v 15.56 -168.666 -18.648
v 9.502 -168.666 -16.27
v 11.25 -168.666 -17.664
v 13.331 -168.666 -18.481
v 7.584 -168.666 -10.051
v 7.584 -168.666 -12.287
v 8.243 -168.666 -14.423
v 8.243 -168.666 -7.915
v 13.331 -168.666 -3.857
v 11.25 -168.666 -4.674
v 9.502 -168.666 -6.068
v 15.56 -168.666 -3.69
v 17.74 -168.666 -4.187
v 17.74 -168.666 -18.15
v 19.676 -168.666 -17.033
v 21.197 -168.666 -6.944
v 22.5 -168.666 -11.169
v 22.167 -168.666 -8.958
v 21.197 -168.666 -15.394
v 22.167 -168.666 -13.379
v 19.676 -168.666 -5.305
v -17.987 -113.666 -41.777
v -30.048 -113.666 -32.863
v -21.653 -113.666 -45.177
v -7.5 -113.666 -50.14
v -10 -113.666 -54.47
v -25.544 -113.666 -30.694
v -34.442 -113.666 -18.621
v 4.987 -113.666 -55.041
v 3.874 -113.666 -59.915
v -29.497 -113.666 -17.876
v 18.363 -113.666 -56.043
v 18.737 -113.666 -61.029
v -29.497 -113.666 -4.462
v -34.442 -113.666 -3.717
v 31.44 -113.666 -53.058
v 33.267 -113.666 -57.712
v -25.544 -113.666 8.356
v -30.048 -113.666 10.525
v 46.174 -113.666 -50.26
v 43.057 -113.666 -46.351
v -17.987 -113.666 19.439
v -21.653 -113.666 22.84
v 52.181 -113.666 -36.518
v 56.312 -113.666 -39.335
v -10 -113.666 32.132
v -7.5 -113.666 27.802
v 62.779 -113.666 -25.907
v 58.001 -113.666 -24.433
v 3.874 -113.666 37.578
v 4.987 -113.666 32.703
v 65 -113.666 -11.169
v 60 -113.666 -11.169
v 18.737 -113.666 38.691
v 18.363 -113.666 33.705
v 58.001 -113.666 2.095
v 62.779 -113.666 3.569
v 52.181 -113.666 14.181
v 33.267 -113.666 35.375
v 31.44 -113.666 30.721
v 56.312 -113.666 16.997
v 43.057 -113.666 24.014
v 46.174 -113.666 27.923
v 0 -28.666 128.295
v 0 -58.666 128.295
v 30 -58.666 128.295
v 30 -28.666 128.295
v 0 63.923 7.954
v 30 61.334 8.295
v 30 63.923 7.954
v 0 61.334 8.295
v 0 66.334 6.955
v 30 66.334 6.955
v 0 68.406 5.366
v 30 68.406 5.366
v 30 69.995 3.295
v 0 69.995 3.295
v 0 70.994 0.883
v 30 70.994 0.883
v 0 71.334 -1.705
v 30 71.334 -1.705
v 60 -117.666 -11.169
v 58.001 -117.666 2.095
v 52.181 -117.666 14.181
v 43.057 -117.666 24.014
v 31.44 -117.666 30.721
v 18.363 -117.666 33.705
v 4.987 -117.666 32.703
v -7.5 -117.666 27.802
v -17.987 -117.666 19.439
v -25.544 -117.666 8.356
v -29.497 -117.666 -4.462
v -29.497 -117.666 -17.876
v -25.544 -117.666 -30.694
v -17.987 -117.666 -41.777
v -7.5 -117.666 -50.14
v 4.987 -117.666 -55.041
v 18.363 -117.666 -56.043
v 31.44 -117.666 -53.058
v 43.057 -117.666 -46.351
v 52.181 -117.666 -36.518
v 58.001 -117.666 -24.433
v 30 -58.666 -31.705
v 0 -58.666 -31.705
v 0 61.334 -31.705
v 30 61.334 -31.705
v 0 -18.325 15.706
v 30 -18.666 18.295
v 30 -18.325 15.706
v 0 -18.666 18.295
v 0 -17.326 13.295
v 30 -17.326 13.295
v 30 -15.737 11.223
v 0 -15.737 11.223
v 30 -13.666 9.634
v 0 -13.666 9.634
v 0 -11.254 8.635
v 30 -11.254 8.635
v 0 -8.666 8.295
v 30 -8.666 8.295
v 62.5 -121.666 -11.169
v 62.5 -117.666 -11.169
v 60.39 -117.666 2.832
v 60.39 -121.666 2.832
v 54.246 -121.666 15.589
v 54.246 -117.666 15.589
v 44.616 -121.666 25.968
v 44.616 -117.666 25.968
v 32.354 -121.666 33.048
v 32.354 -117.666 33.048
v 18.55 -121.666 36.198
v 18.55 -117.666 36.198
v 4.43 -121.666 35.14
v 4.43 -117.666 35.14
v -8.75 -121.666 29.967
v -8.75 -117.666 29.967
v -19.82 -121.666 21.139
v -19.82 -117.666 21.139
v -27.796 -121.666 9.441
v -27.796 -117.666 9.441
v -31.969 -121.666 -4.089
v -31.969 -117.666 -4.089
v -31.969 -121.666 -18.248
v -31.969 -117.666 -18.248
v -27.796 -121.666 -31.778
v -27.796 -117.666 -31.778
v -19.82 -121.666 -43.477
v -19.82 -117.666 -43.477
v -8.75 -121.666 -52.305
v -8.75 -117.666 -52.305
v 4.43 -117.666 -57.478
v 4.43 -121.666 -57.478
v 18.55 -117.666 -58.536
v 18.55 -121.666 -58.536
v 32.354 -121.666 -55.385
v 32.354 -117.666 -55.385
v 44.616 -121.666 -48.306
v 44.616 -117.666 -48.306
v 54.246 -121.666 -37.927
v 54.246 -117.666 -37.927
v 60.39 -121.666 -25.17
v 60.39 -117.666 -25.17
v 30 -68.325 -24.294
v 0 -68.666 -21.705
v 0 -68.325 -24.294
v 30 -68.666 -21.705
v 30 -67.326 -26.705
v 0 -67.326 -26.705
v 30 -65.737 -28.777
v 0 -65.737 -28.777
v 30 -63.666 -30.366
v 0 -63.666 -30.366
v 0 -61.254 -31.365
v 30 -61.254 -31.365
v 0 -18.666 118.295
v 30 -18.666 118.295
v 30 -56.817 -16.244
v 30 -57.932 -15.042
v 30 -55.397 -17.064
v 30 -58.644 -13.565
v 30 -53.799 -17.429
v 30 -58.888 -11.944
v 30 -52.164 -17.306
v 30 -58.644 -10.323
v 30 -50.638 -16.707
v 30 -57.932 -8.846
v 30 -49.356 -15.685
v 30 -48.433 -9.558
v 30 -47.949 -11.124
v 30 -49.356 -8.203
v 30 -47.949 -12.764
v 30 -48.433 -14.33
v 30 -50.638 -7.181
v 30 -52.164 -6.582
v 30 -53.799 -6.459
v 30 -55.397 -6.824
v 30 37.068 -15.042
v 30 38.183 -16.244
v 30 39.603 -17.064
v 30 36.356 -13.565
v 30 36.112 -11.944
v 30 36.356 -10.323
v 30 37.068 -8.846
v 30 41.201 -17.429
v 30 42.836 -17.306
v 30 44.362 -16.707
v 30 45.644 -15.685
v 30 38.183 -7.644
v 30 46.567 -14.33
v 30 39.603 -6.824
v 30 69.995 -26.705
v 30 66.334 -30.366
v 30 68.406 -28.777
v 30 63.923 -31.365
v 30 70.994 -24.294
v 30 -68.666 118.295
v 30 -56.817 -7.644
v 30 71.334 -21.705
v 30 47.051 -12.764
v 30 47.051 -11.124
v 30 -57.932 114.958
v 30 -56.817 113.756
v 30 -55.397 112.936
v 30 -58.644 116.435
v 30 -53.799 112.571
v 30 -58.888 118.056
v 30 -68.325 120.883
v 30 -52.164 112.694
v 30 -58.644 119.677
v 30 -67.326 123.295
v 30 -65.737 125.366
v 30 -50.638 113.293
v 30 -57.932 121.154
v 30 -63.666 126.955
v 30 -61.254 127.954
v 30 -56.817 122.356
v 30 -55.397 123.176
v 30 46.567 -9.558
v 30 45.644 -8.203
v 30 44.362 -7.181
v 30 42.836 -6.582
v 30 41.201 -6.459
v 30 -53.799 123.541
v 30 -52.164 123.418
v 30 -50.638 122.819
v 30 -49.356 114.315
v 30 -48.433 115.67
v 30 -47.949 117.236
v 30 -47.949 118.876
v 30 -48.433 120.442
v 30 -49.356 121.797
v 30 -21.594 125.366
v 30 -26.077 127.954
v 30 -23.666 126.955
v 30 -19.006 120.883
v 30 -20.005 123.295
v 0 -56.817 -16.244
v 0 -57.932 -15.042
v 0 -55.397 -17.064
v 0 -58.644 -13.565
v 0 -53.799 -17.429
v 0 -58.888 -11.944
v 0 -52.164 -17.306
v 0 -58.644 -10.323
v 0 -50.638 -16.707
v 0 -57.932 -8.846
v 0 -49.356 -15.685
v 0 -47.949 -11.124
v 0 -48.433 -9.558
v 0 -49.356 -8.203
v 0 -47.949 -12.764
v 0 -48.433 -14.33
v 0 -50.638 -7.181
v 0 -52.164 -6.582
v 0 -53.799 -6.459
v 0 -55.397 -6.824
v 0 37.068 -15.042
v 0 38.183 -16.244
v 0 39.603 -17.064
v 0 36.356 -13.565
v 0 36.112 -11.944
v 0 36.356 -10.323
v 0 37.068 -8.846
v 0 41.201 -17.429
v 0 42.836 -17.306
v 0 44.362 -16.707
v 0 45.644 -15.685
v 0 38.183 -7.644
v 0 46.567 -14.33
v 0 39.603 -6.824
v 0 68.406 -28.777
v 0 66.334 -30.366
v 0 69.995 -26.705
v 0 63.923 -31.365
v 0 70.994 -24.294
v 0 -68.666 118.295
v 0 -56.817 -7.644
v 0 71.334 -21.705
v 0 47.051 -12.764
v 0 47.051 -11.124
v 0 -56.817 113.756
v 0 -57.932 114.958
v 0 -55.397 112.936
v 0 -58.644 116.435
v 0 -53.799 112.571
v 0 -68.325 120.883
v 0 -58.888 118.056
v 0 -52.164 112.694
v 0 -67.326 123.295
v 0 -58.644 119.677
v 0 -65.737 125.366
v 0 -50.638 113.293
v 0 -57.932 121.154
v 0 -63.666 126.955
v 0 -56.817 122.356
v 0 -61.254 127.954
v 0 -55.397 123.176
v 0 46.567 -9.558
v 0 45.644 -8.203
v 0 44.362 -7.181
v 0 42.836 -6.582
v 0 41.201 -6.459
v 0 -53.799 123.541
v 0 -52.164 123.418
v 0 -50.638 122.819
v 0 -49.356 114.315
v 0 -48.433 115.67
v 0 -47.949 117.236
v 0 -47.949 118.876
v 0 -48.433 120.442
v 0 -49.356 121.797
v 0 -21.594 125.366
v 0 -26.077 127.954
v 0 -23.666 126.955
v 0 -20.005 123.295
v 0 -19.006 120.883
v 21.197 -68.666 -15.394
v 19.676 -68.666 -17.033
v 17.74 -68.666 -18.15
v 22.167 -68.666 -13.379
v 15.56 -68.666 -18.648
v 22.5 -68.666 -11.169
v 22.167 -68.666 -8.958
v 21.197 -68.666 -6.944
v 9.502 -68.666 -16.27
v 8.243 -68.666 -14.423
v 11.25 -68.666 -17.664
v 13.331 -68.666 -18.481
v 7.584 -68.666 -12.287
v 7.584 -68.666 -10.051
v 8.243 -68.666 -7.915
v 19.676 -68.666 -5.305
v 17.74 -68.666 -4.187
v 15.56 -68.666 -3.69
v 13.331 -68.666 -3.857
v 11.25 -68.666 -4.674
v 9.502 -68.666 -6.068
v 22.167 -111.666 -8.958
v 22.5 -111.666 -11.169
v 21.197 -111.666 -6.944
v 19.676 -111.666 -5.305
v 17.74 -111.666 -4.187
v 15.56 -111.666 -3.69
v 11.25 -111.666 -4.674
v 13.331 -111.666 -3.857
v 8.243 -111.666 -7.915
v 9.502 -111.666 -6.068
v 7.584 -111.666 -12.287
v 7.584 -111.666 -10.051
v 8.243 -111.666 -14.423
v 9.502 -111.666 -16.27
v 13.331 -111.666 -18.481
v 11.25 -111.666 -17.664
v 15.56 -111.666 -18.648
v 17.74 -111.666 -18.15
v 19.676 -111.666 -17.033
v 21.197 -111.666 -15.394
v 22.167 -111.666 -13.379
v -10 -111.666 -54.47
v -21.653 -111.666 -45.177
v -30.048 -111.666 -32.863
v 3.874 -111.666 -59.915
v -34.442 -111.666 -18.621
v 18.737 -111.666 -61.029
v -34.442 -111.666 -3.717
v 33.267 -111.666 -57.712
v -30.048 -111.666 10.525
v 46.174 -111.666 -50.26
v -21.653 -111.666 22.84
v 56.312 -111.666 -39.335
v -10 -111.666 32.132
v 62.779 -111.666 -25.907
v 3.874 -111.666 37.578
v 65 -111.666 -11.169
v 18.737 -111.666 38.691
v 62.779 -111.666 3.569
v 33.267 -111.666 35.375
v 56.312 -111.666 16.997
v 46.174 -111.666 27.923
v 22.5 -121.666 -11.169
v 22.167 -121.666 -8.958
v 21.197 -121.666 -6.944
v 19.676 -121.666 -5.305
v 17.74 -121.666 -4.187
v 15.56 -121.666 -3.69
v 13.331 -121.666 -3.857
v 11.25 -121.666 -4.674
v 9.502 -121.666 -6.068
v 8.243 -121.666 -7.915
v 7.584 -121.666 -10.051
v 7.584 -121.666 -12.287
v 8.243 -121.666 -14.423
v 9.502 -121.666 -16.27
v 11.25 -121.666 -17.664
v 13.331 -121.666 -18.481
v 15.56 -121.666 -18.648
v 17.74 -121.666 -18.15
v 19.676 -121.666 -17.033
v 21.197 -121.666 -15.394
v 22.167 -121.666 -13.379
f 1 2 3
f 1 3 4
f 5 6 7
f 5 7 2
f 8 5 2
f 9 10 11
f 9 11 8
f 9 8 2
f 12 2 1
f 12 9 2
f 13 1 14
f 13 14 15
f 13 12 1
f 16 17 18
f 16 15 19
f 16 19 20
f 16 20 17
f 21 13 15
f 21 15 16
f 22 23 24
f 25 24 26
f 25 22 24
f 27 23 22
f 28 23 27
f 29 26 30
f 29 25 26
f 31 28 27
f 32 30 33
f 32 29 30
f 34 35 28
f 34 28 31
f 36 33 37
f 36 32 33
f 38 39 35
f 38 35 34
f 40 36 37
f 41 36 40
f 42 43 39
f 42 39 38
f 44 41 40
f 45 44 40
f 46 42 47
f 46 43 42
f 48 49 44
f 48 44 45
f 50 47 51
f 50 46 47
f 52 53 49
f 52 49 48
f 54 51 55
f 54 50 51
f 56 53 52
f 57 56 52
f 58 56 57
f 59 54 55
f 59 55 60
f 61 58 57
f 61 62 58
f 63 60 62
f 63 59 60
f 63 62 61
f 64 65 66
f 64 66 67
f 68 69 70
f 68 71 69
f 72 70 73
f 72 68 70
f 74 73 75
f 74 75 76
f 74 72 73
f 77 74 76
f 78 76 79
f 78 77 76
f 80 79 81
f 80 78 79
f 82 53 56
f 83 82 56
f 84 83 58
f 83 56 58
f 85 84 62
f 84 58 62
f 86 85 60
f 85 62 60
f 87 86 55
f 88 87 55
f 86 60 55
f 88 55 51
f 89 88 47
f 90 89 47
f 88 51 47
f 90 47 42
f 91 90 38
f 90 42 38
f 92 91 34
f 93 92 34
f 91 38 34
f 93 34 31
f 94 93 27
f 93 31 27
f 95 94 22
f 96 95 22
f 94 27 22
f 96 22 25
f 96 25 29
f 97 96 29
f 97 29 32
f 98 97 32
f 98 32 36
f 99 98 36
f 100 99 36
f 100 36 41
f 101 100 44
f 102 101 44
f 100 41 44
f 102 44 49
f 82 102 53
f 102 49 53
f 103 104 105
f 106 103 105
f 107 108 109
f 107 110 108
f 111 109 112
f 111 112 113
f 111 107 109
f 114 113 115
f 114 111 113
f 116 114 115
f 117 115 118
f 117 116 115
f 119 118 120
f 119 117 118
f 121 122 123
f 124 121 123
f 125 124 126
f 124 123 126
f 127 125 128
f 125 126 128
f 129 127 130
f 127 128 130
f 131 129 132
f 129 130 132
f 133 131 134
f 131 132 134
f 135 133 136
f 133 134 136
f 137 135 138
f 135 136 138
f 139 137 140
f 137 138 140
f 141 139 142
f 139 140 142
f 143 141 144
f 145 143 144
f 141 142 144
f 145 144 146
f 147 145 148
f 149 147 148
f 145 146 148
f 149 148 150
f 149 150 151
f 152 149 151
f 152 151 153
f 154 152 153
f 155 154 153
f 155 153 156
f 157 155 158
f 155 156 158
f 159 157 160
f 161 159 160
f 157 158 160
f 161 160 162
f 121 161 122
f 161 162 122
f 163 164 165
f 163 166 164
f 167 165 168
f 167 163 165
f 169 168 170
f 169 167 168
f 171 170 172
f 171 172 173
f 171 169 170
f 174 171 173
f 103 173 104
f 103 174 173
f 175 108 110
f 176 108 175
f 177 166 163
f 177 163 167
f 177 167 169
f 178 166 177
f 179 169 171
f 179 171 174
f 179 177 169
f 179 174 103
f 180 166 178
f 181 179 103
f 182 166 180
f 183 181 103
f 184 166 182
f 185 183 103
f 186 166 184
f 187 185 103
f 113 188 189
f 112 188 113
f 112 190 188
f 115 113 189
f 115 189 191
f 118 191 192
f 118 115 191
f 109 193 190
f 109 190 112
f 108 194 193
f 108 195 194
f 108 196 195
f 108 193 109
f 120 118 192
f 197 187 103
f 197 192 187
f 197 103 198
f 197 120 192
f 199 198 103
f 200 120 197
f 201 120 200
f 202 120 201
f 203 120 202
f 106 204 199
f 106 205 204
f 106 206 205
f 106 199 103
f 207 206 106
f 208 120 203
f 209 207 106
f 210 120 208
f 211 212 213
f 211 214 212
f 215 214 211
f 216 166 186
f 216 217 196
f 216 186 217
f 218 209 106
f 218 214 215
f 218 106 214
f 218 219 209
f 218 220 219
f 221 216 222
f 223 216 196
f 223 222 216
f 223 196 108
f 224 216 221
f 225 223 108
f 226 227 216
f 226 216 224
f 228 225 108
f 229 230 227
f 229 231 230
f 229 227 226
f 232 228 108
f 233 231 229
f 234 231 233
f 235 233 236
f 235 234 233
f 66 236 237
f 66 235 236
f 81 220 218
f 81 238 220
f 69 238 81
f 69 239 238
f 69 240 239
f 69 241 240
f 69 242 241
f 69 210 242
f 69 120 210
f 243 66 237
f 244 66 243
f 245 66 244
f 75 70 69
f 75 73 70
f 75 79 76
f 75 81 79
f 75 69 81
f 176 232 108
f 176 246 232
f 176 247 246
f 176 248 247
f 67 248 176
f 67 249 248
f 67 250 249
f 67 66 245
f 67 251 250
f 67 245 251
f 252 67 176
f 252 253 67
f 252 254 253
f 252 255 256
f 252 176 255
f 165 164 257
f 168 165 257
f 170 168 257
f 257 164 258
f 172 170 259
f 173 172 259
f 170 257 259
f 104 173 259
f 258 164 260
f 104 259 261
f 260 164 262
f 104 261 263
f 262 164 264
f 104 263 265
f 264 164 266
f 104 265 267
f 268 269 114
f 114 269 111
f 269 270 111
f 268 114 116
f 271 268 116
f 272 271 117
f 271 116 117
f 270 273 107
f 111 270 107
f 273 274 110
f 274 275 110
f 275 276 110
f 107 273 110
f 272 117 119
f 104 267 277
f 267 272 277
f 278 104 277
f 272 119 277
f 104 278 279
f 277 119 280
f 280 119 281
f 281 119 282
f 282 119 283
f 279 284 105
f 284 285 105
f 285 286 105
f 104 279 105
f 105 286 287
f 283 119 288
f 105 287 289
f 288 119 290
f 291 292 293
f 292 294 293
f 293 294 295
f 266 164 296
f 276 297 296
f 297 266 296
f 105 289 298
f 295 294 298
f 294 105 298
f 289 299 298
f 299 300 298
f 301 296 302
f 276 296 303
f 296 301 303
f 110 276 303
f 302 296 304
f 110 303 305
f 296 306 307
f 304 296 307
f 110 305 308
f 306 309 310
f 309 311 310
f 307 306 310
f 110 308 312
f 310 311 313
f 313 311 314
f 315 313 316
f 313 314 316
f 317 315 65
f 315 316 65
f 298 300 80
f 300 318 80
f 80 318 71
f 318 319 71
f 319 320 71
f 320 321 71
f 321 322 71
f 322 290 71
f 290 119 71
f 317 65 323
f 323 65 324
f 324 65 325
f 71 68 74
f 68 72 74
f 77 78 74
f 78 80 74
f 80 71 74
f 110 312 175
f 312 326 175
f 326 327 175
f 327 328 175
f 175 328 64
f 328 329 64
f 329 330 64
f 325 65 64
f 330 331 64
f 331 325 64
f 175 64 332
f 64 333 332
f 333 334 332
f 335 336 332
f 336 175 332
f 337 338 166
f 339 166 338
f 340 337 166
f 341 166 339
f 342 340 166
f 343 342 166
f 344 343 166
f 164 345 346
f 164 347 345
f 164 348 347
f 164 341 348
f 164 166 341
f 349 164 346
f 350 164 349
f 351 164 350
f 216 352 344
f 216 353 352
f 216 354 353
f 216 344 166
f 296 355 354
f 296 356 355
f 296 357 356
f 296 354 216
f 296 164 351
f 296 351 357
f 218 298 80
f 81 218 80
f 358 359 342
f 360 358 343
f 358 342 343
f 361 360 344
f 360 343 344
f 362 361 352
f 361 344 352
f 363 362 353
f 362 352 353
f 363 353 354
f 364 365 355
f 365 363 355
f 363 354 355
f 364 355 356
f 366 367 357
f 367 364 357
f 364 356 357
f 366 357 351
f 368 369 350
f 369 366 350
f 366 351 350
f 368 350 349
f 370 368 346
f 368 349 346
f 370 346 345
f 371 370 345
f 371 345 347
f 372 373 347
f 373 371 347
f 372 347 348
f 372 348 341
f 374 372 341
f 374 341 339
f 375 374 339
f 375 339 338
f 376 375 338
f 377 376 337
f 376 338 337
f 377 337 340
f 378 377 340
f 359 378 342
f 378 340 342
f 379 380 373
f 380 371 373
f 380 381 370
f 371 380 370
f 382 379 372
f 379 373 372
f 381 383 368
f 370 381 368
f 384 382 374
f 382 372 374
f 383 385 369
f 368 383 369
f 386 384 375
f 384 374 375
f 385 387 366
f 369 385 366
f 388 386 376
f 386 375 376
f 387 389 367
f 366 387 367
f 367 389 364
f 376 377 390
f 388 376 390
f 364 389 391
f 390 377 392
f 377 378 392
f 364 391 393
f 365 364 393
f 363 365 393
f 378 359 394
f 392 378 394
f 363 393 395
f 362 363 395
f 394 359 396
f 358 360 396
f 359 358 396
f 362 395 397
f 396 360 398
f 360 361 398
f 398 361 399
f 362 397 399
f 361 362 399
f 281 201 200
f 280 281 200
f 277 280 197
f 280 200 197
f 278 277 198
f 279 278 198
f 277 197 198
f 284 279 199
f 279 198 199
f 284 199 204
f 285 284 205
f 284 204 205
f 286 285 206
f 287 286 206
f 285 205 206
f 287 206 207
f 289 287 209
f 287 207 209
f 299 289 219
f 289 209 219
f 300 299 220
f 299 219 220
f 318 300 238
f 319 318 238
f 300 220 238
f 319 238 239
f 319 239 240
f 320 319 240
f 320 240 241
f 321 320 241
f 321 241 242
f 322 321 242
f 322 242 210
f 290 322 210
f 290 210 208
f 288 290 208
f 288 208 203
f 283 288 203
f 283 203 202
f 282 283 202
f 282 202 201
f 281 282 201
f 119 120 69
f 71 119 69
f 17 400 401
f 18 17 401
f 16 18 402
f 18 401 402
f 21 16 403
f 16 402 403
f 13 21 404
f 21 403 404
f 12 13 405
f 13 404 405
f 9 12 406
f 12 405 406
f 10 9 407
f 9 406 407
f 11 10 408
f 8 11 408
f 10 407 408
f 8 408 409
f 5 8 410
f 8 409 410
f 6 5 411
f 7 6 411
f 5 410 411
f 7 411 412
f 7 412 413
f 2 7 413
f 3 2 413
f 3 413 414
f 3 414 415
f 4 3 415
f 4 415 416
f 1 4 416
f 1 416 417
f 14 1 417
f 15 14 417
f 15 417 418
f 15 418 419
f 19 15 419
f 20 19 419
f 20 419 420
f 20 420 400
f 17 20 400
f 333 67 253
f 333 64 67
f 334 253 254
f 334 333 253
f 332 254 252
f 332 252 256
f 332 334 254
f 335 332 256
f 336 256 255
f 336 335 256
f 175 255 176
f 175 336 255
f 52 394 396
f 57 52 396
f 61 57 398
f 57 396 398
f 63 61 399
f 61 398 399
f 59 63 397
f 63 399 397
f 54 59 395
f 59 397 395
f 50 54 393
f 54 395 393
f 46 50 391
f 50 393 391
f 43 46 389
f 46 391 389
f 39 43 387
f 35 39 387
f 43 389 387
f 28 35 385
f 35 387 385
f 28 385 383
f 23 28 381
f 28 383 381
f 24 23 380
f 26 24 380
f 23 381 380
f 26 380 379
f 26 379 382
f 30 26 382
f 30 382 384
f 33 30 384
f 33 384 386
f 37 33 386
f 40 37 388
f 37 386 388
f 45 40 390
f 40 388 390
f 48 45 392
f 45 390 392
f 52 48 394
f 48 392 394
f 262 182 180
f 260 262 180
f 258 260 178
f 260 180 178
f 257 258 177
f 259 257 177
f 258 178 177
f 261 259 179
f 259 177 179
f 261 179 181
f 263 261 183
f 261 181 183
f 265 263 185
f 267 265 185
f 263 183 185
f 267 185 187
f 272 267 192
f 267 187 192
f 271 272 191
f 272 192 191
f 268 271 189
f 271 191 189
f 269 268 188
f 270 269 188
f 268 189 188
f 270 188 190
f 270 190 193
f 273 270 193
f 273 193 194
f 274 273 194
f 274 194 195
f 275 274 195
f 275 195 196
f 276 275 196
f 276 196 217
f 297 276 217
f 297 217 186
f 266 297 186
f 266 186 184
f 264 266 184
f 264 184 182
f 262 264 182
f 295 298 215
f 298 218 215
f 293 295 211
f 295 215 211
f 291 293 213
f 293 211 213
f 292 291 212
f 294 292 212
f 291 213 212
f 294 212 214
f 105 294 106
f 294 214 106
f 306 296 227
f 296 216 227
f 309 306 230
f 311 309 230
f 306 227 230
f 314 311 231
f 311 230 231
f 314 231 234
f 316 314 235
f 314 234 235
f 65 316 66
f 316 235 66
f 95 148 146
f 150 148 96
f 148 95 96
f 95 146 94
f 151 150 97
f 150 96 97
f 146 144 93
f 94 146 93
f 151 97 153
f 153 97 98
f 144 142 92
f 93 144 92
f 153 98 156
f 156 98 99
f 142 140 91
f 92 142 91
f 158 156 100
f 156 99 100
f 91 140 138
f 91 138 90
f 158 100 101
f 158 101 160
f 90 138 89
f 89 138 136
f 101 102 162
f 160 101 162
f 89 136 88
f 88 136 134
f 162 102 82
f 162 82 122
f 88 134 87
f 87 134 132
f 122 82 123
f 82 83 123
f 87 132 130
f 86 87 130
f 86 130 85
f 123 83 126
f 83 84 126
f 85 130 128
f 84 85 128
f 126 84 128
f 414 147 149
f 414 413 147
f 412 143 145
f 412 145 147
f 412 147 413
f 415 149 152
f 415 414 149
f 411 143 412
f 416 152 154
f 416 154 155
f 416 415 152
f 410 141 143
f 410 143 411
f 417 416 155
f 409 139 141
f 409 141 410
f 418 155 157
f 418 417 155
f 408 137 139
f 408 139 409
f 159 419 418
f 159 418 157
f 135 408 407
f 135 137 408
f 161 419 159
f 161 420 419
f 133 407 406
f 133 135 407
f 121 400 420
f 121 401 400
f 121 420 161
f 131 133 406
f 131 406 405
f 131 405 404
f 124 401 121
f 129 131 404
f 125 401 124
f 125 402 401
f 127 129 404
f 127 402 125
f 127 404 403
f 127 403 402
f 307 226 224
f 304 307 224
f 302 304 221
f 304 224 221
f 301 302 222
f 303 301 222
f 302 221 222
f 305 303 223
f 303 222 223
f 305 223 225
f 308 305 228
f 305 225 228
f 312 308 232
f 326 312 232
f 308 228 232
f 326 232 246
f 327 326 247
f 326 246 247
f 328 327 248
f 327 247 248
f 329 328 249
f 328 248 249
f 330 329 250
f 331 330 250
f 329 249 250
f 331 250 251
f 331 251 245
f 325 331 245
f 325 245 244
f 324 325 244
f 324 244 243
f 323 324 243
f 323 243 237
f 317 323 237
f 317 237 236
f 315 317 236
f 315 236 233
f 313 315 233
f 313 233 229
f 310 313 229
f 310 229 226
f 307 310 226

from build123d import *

# Parameters (mm, degrees)
F1_W      = 140
F1_H      = 160
F2_DEPTH  = 30
F3_R      = 10
F4_W      = 90
F4_H      = 120
F5_DEPTH  = 30.001
F6_R      = 10
F7_D      = 11
F8_R      = 7.5
F9_DEPTH  = 100
F11_R     = 50
F12_DEPTH = 2
F13_R     = 45
F13_R_2   = 7.5
F14_DEPTH = 4
F15_R     = 47.5
F16_DEPTH = 4


with BuildPart() as f2:
    # F1 (on Right) → F2 (new body)
    with BuildSketch(Plane.YZ):
        with Locations((1.3344958425, 48.294539011)):
            Rectangle(F1_W, F1_H)
    extrude(amount=F2_DEPTH)

    # F3
    f3_edges = [f2.edges().sort_by_distance(p)[0] for p in [
        (15, -68.665504, 128.294539),
        (15, -68.665504, -31.705461),
    ]]
    fillet(f3_edges, radius=F3_R)

    # F4 (on face) → F5 (cut, through all)
    with BuildSketch(Plane.YZ.offset(30)):
        with Locations((26.3344958425, 68.294539011)):
            Rectangle(F4_W, F4_H)
    extrude(amount=-F5_DEPTH, mode=Mode.SUBTRACT)

    # F6
    f6_edges = [f2.edges().sort_by_distance(p)[0] for p in [
        (15, -18.665504, 128.294539),
        (15, -18.665504, 8.294539),
        (15, 71.334496, 8.294539),
        (15, 71.334496, -31.705461),
    ]]
    fillet(f6_edges, radius=F6_R)

    # F7 (through all)
    with Locations(Plane(origin=(0, 0, 0), x_dir=(0, 1, 0), z_dir=(-1, 0, 0))):
        with Locations((-53.3879697323, -118.0560608581), (-53.3879697323, 11.9439391419), (41.6120302677, 11.9439391419)):
            Hole(F7_D / 2)

    # F8 (on face) → F9 (join)
    with BuildSketch(Plane.XZ.offset(68.6655041575)):
        with Locations((15, -11.168804951)):
            Circle(F8_R)
    extrude(amount=F9_DEPTH)

    # F11 (on offset) → F12 (join)
    with BuildSketch(Plane.XZ.offset(111.6655041575)):
        with Locations((15, -11.168804951)):
            Circle(F11_R)
    extrude(amount=F12_DEPTH)

    # F13 (on face) → F14 (join)
    with BuildSketch(Plane.XZ.offset(113.6655041575)):
        with Locations((15, -11.168804951)):
            Circle(F13_R)
        with Locations((15, -11.168804951)):
            Circle(F13_R_2, mode=Mode.SUBTRACT)
    extrude(amount=F14_DEPTH)

    # F15 (on face) → F16 (join)
    with BuildSketch(Plane.XZ.offset(117.6655041575)):
        with Locations((15, -11.168804951)):
            Circle(F15_R)
    extrude(amount=F16_DEPTH)


solid = f2.part
